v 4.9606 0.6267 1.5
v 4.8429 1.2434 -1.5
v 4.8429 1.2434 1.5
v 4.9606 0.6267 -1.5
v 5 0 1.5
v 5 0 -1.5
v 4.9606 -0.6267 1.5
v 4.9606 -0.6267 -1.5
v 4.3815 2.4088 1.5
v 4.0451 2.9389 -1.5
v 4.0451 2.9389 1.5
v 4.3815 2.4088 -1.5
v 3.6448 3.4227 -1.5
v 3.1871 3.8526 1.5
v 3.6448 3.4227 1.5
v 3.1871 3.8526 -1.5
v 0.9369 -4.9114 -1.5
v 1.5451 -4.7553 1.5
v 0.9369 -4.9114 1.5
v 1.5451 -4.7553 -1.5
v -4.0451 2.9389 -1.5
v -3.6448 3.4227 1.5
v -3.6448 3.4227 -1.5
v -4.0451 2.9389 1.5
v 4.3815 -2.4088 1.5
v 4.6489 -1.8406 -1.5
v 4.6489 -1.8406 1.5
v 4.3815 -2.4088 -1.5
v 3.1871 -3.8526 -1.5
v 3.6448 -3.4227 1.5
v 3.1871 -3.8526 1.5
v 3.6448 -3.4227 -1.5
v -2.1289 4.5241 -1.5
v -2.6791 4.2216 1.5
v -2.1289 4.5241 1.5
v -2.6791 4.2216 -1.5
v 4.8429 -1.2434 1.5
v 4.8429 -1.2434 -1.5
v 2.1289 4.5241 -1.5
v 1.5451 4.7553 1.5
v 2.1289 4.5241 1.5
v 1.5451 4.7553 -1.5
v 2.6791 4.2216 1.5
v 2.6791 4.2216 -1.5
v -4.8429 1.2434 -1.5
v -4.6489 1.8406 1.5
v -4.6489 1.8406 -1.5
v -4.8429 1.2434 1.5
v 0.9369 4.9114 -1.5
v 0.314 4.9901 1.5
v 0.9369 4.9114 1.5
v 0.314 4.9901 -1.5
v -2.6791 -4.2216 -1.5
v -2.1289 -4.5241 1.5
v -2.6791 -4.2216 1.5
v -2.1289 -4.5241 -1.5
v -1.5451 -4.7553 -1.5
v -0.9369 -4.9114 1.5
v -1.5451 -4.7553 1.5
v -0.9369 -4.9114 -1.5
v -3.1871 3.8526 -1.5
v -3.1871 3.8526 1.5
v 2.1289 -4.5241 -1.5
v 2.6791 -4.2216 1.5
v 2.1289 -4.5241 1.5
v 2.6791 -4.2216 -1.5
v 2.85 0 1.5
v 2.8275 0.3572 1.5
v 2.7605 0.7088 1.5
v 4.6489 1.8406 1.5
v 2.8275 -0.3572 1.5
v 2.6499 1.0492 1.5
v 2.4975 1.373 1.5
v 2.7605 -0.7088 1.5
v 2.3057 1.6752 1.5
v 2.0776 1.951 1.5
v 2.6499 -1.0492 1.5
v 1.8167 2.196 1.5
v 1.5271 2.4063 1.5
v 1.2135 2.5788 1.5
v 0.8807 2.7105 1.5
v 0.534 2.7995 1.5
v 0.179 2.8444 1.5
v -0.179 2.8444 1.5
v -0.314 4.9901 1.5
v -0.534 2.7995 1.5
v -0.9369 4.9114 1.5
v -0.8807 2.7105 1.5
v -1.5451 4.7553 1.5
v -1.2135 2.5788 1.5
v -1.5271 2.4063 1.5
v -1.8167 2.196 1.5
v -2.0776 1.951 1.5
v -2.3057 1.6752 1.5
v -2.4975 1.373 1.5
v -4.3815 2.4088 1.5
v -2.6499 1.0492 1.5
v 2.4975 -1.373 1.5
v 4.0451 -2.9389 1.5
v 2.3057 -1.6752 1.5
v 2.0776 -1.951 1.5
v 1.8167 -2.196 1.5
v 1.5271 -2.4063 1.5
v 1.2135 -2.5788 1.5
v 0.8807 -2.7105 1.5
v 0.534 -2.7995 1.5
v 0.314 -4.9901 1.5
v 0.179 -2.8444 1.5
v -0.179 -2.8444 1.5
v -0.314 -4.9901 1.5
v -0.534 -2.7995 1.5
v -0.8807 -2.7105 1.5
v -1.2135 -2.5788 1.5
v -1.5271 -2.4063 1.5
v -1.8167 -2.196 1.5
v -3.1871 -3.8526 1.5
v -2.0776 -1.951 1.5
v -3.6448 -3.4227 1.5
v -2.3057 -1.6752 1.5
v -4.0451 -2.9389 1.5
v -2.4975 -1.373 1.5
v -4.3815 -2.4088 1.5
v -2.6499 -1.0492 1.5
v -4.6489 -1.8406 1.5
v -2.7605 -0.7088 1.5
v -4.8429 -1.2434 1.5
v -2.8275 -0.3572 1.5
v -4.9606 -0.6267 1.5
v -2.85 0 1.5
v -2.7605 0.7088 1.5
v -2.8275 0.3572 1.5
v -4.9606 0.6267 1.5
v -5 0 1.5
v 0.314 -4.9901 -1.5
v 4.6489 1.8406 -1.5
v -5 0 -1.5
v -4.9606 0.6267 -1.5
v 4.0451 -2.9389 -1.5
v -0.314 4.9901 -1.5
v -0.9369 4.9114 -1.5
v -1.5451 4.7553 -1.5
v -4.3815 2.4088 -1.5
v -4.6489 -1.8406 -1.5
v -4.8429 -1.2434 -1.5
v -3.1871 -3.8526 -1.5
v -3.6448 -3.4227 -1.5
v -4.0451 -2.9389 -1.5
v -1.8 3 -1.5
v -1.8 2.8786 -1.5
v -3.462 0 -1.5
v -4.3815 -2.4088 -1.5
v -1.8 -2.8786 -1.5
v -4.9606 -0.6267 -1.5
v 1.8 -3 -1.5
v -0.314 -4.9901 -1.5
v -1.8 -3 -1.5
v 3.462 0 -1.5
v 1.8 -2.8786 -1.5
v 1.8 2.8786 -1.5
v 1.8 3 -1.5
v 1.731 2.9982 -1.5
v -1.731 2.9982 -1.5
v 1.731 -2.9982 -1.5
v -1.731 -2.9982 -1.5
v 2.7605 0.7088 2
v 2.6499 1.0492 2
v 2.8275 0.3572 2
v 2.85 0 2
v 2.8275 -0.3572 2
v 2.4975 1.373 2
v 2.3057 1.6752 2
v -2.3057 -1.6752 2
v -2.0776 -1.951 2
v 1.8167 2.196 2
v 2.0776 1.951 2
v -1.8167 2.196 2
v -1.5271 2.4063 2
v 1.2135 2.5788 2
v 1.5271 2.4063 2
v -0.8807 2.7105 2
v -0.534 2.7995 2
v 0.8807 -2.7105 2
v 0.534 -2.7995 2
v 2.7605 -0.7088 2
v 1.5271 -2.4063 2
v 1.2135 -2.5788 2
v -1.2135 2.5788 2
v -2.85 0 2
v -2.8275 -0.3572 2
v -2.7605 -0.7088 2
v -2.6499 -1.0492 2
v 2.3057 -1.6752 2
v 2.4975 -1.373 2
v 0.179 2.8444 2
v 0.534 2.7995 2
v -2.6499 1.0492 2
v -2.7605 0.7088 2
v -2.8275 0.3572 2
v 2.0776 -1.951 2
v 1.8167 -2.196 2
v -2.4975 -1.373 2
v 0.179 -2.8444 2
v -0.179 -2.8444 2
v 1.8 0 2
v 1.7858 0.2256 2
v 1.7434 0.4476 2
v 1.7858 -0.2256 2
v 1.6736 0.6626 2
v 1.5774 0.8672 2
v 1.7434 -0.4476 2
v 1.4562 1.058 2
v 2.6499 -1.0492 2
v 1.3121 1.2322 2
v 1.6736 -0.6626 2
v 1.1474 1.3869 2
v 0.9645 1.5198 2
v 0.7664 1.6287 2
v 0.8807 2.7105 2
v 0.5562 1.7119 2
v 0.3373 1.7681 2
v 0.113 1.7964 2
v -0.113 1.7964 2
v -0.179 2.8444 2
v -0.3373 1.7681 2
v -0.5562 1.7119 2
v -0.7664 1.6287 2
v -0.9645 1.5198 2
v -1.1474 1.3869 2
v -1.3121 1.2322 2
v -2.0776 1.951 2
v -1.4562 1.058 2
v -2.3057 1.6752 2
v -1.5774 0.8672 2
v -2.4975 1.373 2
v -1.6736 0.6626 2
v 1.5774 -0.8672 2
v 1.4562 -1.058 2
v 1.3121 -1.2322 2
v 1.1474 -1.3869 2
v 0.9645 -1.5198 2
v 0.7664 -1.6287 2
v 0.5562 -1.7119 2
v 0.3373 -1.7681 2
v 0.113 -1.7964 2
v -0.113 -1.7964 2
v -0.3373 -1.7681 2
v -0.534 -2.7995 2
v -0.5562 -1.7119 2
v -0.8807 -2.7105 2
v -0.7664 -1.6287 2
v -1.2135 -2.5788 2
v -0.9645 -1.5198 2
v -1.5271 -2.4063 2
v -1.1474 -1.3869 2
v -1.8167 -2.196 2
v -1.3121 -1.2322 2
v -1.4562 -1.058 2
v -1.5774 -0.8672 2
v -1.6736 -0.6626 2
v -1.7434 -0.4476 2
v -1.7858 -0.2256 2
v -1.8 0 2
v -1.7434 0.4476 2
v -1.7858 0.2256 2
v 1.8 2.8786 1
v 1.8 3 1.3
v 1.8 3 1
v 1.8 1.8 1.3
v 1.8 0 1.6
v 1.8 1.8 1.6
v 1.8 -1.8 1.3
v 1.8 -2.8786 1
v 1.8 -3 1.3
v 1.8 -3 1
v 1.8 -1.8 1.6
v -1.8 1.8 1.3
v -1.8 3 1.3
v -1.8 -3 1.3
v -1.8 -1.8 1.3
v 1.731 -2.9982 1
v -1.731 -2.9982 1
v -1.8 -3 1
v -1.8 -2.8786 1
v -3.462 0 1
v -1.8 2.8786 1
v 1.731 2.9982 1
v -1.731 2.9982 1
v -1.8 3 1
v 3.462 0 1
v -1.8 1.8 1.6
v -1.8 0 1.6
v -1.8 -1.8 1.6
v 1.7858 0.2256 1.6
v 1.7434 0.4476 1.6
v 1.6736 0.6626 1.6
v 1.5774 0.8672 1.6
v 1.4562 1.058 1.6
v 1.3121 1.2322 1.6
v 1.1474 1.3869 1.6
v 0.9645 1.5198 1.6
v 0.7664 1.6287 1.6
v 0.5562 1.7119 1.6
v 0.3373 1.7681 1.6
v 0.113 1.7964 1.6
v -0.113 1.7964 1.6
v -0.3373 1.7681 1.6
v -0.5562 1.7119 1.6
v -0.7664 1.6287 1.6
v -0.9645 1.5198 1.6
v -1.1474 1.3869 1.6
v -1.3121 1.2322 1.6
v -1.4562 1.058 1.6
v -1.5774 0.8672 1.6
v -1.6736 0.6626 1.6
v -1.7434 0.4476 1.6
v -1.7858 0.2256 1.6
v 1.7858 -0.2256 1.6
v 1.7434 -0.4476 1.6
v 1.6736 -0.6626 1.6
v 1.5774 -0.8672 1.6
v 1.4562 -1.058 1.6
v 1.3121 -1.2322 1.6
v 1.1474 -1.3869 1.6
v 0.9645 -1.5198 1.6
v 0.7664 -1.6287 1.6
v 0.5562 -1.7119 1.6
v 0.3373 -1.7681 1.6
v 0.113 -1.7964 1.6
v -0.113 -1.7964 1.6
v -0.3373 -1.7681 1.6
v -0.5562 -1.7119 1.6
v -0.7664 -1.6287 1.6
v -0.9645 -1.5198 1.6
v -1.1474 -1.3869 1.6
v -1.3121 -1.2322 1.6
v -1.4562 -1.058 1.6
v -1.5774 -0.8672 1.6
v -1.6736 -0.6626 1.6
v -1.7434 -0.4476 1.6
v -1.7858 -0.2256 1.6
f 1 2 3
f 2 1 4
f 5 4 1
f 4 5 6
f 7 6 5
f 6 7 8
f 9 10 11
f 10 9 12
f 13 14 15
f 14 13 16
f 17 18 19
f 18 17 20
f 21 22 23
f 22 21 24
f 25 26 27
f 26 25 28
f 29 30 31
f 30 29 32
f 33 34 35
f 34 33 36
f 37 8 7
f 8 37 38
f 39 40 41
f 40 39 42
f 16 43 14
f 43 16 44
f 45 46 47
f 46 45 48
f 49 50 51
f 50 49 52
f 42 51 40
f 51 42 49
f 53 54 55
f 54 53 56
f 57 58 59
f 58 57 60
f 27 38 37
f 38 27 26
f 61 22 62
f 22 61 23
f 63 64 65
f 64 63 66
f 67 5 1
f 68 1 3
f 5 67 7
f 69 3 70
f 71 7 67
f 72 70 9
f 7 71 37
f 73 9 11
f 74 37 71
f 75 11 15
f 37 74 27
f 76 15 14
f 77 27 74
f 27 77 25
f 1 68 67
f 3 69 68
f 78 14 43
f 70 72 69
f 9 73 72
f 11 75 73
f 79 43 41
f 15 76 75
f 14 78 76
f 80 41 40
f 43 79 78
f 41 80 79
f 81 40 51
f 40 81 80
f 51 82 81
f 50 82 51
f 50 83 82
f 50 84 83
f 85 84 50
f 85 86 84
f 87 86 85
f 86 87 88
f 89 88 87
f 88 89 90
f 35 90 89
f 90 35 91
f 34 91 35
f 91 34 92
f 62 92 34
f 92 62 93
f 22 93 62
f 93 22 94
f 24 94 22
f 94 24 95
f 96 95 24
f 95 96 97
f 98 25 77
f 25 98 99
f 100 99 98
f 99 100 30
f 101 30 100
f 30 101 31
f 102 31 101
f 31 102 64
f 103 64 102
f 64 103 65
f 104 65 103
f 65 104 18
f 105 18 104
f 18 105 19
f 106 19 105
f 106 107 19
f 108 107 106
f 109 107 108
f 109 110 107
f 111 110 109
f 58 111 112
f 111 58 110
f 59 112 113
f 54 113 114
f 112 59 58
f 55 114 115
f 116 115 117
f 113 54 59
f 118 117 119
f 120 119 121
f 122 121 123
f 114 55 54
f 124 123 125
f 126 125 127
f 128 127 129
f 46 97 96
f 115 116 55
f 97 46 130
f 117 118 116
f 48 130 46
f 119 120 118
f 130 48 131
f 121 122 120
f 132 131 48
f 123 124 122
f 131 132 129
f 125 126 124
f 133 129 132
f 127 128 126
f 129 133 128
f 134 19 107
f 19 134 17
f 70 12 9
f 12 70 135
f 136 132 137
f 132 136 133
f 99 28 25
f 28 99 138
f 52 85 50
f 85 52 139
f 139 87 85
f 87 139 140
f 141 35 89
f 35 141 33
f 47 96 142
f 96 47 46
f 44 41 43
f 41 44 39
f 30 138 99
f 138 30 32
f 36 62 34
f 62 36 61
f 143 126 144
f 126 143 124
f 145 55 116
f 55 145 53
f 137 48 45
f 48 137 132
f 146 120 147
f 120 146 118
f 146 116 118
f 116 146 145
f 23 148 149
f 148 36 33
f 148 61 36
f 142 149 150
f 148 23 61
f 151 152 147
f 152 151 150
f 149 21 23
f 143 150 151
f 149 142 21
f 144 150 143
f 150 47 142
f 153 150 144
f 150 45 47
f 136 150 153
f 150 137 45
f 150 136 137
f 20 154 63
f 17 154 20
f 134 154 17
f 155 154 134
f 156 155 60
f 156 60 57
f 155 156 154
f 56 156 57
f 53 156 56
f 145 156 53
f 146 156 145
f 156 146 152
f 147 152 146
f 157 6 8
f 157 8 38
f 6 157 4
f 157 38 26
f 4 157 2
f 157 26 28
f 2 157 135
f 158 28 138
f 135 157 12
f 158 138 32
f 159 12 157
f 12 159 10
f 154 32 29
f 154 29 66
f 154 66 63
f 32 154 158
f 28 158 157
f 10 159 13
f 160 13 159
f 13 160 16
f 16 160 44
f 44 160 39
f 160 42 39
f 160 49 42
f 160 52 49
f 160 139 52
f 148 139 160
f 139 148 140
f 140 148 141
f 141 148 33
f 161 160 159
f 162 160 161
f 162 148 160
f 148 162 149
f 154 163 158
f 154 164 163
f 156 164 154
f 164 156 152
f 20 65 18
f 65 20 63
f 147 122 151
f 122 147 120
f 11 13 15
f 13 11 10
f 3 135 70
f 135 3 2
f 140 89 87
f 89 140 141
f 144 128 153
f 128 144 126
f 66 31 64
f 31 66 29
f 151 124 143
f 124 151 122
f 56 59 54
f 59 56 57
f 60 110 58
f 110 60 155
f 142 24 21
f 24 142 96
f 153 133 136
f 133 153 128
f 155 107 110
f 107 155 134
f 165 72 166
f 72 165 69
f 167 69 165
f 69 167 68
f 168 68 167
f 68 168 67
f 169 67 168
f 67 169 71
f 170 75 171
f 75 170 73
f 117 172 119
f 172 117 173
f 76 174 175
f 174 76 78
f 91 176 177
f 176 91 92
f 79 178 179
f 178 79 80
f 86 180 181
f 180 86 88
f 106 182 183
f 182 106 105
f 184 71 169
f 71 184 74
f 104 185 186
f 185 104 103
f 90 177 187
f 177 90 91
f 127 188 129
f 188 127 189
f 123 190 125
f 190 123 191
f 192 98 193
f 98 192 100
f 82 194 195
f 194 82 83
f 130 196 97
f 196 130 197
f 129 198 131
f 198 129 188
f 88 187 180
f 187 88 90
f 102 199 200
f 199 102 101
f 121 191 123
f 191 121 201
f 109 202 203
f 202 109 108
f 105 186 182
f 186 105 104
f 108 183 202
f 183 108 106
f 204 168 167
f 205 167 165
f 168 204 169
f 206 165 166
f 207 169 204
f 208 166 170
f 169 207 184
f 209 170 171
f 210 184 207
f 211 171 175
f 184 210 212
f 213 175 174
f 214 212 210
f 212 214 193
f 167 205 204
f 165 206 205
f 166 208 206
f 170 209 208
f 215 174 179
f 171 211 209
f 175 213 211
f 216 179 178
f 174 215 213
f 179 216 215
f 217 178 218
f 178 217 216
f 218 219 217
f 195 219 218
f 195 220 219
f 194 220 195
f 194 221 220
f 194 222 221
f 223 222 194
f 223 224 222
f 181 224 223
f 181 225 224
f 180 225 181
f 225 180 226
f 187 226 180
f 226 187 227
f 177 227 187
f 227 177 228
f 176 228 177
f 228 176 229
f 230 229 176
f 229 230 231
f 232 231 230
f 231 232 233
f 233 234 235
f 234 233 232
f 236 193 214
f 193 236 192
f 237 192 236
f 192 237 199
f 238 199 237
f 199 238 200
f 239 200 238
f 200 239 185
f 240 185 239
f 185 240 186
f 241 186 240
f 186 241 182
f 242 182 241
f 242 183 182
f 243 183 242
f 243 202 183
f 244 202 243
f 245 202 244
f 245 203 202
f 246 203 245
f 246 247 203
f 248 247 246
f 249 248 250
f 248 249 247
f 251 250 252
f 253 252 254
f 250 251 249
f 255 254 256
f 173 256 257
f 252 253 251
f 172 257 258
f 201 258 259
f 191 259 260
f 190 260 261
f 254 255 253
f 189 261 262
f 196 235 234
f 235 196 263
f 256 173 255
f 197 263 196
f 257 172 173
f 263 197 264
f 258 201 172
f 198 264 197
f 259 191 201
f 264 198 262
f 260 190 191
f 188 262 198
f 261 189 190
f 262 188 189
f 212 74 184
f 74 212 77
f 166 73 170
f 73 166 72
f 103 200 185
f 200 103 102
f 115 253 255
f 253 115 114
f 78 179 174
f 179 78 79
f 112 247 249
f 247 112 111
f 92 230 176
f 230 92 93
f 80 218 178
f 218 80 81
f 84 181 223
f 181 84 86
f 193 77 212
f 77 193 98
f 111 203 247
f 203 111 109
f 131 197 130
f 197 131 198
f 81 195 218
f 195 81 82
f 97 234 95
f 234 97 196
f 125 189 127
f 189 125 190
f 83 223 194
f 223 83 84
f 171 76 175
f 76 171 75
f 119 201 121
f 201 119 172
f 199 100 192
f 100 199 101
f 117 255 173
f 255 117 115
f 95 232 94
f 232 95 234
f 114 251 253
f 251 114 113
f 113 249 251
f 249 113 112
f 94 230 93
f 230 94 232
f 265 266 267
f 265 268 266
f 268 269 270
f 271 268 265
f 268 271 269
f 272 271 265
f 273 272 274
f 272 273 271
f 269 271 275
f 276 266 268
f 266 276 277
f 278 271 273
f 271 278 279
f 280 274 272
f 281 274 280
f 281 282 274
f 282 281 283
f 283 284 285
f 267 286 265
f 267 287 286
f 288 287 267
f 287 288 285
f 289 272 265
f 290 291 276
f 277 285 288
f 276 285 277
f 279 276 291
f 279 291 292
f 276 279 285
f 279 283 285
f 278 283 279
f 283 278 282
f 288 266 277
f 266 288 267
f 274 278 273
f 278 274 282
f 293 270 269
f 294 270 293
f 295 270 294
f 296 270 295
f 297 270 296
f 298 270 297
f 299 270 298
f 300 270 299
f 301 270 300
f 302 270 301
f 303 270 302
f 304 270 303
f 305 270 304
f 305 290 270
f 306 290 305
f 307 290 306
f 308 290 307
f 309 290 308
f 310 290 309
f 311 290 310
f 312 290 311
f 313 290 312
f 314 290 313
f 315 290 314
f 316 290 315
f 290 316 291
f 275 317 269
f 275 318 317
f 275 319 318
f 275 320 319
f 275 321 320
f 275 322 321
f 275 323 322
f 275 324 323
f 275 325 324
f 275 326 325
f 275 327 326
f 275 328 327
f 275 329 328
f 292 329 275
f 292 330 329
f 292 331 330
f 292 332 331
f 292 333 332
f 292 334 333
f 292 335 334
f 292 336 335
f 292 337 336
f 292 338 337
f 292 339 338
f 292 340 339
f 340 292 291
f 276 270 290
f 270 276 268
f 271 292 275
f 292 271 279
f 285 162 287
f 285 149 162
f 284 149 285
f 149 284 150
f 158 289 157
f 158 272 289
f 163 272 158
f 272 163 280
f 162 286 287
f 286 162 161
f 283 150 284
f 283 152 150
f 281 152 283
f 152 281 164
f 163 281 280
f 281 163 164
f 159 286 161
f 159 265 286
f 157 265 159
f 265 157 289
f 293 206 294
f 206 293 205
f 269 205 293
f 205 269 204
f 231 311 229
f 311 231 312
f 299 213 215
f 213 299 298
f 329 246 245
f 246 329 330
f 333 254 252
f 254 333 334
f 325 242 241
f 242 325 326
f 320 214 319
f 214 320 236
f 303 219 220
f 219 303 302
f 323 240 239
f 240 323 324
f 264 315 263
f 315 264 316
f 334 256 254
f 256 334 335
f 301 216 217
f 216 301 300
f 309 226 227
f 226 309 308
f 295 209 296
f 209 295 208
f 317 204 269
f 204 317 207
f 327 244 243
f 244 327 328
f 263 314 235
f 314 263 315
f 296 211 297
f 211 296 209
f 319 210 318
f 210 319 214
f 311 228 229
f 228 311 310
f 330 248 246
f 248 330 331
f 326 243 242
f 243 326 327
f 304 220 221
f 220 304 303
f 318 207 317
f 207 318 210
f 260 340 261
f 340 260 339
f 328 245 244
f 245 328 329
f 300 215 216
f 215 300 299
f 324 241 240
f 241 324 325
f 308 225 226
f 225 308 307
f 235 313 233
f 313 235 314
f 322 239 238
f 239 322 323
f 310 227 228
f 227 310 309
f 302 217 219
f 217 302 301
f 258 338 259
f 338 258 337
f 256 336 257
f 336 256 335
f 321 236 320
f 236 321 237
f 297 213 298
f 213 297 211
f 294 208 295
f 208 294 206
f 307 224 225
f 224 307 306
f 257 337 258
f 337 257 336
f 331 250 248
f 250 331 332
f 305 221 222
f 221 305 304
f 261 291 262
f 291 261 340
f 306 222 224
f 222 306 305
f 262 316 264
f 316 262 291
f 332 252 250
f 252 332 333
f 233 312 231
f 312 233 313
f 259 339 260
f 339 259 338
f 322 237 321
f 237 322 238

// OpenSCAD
$fn = 50;


difference() {
	union() {
		translate(v = [0, 0, -1.5000000000]) {
			cylinder(h = 3, r = 5.0000000000);
		}
		translate(v = [0, 0, -1.5000000000]) {
			cylinder(h = 3.5000000000, r = 2.8500000000);
		}
	}
	union() {
		translate(v = [0, 0, -1.5000000000]) {
			rotate(a = [0, 0, 0]) {
				difference() {
					union() {
						translate(v = [-1.8000000000, -3.0000000000, -0.3000000000]) {
							cube(size = [3.6000000000, 6.0000000000, 0.3000000000]);
						}
						translate(v = [-1.8000000000, -1.8000000000, -0.6000000000]) {
							cube(size = [3.6000000000, 3.6000000000, 0.3000000000]);
						}
						translate(v = [-1.8000000000, -3.0000000000, 2.5000000000]) {
							cube(size = [3.6000000000, 6.0000000000, 0.3000000000]);
						}
						translate(v = [-1.8000000000, -1.8000000000, 2.8000000000]) {
							cube(size = [3.6000000000, 3.6000000000, 0.3000000000]);
						}
						linear_extrude(height = 2.5000000000) {
							polygon(points = [[3.4620000000, 0.0000000000], [1.7310000000, 2.9981799479], [-1.7310000000, 2.9981799479], [-3.4620000000, 0.0000000000], [-1.7310000000, -2.9981799479], [1.7310000000, -2.9981799479]]);
						}
						translate(v = [-1.8000000000, -3.0000000000, -0.3000000000]) {
							cube(size = [3.6000000000, 6.0000000000, 0.3000000000]);
						}
						translate(v = [-1.8000000000, -1.8000000000, -0.6000000000]) {
							cube(size = [3.6000000000, 3.6000000000, 0.3000000000]);
						}
						translate(v = [-1.8000000000, -3.0000000000, 2.5000000000]) {
							cube(size = [3.6000000000, 6.0000000000, 0.3000000000]);
						}
						translate(v = [-1.8000000000, -1.8000000000, 2.8000000000]) {
							cube(size = [3.6000000000, 3.6000000000, 0.3000000000]);
						}
						translate(v = [-1.8000000000, -3.0000000000, -0.3000000000]) {
							cube(size = [3.6000000000, 6.0000000000, 0.3000000000]);
						}
						translate(v = [-1.8000000000, -1.8000000000, -0.6000000000]) {
							cube(size = [3.6000000000, 3.6000000000, 0.3000000000]);
						}
						translate(v = [-1.8000000000, -3.0000000000, 2.5000000000]) {
							cube(size = [3.6000000000, 6.0000000000, 0.3000000000]);
						}
						translate(v = [-1.8000000000, -1.8000000000, 2.8000000000]) {
							cube(size = [3.6000000000, 3.6000000000, 0.3000000000]);
						}
					}
					union();
				}
			}
		}
		translate(v = [0, 0, -50.0000000000]) {
			cylinder(h = 100, r = 1.8000000000);
		}
	}
}
